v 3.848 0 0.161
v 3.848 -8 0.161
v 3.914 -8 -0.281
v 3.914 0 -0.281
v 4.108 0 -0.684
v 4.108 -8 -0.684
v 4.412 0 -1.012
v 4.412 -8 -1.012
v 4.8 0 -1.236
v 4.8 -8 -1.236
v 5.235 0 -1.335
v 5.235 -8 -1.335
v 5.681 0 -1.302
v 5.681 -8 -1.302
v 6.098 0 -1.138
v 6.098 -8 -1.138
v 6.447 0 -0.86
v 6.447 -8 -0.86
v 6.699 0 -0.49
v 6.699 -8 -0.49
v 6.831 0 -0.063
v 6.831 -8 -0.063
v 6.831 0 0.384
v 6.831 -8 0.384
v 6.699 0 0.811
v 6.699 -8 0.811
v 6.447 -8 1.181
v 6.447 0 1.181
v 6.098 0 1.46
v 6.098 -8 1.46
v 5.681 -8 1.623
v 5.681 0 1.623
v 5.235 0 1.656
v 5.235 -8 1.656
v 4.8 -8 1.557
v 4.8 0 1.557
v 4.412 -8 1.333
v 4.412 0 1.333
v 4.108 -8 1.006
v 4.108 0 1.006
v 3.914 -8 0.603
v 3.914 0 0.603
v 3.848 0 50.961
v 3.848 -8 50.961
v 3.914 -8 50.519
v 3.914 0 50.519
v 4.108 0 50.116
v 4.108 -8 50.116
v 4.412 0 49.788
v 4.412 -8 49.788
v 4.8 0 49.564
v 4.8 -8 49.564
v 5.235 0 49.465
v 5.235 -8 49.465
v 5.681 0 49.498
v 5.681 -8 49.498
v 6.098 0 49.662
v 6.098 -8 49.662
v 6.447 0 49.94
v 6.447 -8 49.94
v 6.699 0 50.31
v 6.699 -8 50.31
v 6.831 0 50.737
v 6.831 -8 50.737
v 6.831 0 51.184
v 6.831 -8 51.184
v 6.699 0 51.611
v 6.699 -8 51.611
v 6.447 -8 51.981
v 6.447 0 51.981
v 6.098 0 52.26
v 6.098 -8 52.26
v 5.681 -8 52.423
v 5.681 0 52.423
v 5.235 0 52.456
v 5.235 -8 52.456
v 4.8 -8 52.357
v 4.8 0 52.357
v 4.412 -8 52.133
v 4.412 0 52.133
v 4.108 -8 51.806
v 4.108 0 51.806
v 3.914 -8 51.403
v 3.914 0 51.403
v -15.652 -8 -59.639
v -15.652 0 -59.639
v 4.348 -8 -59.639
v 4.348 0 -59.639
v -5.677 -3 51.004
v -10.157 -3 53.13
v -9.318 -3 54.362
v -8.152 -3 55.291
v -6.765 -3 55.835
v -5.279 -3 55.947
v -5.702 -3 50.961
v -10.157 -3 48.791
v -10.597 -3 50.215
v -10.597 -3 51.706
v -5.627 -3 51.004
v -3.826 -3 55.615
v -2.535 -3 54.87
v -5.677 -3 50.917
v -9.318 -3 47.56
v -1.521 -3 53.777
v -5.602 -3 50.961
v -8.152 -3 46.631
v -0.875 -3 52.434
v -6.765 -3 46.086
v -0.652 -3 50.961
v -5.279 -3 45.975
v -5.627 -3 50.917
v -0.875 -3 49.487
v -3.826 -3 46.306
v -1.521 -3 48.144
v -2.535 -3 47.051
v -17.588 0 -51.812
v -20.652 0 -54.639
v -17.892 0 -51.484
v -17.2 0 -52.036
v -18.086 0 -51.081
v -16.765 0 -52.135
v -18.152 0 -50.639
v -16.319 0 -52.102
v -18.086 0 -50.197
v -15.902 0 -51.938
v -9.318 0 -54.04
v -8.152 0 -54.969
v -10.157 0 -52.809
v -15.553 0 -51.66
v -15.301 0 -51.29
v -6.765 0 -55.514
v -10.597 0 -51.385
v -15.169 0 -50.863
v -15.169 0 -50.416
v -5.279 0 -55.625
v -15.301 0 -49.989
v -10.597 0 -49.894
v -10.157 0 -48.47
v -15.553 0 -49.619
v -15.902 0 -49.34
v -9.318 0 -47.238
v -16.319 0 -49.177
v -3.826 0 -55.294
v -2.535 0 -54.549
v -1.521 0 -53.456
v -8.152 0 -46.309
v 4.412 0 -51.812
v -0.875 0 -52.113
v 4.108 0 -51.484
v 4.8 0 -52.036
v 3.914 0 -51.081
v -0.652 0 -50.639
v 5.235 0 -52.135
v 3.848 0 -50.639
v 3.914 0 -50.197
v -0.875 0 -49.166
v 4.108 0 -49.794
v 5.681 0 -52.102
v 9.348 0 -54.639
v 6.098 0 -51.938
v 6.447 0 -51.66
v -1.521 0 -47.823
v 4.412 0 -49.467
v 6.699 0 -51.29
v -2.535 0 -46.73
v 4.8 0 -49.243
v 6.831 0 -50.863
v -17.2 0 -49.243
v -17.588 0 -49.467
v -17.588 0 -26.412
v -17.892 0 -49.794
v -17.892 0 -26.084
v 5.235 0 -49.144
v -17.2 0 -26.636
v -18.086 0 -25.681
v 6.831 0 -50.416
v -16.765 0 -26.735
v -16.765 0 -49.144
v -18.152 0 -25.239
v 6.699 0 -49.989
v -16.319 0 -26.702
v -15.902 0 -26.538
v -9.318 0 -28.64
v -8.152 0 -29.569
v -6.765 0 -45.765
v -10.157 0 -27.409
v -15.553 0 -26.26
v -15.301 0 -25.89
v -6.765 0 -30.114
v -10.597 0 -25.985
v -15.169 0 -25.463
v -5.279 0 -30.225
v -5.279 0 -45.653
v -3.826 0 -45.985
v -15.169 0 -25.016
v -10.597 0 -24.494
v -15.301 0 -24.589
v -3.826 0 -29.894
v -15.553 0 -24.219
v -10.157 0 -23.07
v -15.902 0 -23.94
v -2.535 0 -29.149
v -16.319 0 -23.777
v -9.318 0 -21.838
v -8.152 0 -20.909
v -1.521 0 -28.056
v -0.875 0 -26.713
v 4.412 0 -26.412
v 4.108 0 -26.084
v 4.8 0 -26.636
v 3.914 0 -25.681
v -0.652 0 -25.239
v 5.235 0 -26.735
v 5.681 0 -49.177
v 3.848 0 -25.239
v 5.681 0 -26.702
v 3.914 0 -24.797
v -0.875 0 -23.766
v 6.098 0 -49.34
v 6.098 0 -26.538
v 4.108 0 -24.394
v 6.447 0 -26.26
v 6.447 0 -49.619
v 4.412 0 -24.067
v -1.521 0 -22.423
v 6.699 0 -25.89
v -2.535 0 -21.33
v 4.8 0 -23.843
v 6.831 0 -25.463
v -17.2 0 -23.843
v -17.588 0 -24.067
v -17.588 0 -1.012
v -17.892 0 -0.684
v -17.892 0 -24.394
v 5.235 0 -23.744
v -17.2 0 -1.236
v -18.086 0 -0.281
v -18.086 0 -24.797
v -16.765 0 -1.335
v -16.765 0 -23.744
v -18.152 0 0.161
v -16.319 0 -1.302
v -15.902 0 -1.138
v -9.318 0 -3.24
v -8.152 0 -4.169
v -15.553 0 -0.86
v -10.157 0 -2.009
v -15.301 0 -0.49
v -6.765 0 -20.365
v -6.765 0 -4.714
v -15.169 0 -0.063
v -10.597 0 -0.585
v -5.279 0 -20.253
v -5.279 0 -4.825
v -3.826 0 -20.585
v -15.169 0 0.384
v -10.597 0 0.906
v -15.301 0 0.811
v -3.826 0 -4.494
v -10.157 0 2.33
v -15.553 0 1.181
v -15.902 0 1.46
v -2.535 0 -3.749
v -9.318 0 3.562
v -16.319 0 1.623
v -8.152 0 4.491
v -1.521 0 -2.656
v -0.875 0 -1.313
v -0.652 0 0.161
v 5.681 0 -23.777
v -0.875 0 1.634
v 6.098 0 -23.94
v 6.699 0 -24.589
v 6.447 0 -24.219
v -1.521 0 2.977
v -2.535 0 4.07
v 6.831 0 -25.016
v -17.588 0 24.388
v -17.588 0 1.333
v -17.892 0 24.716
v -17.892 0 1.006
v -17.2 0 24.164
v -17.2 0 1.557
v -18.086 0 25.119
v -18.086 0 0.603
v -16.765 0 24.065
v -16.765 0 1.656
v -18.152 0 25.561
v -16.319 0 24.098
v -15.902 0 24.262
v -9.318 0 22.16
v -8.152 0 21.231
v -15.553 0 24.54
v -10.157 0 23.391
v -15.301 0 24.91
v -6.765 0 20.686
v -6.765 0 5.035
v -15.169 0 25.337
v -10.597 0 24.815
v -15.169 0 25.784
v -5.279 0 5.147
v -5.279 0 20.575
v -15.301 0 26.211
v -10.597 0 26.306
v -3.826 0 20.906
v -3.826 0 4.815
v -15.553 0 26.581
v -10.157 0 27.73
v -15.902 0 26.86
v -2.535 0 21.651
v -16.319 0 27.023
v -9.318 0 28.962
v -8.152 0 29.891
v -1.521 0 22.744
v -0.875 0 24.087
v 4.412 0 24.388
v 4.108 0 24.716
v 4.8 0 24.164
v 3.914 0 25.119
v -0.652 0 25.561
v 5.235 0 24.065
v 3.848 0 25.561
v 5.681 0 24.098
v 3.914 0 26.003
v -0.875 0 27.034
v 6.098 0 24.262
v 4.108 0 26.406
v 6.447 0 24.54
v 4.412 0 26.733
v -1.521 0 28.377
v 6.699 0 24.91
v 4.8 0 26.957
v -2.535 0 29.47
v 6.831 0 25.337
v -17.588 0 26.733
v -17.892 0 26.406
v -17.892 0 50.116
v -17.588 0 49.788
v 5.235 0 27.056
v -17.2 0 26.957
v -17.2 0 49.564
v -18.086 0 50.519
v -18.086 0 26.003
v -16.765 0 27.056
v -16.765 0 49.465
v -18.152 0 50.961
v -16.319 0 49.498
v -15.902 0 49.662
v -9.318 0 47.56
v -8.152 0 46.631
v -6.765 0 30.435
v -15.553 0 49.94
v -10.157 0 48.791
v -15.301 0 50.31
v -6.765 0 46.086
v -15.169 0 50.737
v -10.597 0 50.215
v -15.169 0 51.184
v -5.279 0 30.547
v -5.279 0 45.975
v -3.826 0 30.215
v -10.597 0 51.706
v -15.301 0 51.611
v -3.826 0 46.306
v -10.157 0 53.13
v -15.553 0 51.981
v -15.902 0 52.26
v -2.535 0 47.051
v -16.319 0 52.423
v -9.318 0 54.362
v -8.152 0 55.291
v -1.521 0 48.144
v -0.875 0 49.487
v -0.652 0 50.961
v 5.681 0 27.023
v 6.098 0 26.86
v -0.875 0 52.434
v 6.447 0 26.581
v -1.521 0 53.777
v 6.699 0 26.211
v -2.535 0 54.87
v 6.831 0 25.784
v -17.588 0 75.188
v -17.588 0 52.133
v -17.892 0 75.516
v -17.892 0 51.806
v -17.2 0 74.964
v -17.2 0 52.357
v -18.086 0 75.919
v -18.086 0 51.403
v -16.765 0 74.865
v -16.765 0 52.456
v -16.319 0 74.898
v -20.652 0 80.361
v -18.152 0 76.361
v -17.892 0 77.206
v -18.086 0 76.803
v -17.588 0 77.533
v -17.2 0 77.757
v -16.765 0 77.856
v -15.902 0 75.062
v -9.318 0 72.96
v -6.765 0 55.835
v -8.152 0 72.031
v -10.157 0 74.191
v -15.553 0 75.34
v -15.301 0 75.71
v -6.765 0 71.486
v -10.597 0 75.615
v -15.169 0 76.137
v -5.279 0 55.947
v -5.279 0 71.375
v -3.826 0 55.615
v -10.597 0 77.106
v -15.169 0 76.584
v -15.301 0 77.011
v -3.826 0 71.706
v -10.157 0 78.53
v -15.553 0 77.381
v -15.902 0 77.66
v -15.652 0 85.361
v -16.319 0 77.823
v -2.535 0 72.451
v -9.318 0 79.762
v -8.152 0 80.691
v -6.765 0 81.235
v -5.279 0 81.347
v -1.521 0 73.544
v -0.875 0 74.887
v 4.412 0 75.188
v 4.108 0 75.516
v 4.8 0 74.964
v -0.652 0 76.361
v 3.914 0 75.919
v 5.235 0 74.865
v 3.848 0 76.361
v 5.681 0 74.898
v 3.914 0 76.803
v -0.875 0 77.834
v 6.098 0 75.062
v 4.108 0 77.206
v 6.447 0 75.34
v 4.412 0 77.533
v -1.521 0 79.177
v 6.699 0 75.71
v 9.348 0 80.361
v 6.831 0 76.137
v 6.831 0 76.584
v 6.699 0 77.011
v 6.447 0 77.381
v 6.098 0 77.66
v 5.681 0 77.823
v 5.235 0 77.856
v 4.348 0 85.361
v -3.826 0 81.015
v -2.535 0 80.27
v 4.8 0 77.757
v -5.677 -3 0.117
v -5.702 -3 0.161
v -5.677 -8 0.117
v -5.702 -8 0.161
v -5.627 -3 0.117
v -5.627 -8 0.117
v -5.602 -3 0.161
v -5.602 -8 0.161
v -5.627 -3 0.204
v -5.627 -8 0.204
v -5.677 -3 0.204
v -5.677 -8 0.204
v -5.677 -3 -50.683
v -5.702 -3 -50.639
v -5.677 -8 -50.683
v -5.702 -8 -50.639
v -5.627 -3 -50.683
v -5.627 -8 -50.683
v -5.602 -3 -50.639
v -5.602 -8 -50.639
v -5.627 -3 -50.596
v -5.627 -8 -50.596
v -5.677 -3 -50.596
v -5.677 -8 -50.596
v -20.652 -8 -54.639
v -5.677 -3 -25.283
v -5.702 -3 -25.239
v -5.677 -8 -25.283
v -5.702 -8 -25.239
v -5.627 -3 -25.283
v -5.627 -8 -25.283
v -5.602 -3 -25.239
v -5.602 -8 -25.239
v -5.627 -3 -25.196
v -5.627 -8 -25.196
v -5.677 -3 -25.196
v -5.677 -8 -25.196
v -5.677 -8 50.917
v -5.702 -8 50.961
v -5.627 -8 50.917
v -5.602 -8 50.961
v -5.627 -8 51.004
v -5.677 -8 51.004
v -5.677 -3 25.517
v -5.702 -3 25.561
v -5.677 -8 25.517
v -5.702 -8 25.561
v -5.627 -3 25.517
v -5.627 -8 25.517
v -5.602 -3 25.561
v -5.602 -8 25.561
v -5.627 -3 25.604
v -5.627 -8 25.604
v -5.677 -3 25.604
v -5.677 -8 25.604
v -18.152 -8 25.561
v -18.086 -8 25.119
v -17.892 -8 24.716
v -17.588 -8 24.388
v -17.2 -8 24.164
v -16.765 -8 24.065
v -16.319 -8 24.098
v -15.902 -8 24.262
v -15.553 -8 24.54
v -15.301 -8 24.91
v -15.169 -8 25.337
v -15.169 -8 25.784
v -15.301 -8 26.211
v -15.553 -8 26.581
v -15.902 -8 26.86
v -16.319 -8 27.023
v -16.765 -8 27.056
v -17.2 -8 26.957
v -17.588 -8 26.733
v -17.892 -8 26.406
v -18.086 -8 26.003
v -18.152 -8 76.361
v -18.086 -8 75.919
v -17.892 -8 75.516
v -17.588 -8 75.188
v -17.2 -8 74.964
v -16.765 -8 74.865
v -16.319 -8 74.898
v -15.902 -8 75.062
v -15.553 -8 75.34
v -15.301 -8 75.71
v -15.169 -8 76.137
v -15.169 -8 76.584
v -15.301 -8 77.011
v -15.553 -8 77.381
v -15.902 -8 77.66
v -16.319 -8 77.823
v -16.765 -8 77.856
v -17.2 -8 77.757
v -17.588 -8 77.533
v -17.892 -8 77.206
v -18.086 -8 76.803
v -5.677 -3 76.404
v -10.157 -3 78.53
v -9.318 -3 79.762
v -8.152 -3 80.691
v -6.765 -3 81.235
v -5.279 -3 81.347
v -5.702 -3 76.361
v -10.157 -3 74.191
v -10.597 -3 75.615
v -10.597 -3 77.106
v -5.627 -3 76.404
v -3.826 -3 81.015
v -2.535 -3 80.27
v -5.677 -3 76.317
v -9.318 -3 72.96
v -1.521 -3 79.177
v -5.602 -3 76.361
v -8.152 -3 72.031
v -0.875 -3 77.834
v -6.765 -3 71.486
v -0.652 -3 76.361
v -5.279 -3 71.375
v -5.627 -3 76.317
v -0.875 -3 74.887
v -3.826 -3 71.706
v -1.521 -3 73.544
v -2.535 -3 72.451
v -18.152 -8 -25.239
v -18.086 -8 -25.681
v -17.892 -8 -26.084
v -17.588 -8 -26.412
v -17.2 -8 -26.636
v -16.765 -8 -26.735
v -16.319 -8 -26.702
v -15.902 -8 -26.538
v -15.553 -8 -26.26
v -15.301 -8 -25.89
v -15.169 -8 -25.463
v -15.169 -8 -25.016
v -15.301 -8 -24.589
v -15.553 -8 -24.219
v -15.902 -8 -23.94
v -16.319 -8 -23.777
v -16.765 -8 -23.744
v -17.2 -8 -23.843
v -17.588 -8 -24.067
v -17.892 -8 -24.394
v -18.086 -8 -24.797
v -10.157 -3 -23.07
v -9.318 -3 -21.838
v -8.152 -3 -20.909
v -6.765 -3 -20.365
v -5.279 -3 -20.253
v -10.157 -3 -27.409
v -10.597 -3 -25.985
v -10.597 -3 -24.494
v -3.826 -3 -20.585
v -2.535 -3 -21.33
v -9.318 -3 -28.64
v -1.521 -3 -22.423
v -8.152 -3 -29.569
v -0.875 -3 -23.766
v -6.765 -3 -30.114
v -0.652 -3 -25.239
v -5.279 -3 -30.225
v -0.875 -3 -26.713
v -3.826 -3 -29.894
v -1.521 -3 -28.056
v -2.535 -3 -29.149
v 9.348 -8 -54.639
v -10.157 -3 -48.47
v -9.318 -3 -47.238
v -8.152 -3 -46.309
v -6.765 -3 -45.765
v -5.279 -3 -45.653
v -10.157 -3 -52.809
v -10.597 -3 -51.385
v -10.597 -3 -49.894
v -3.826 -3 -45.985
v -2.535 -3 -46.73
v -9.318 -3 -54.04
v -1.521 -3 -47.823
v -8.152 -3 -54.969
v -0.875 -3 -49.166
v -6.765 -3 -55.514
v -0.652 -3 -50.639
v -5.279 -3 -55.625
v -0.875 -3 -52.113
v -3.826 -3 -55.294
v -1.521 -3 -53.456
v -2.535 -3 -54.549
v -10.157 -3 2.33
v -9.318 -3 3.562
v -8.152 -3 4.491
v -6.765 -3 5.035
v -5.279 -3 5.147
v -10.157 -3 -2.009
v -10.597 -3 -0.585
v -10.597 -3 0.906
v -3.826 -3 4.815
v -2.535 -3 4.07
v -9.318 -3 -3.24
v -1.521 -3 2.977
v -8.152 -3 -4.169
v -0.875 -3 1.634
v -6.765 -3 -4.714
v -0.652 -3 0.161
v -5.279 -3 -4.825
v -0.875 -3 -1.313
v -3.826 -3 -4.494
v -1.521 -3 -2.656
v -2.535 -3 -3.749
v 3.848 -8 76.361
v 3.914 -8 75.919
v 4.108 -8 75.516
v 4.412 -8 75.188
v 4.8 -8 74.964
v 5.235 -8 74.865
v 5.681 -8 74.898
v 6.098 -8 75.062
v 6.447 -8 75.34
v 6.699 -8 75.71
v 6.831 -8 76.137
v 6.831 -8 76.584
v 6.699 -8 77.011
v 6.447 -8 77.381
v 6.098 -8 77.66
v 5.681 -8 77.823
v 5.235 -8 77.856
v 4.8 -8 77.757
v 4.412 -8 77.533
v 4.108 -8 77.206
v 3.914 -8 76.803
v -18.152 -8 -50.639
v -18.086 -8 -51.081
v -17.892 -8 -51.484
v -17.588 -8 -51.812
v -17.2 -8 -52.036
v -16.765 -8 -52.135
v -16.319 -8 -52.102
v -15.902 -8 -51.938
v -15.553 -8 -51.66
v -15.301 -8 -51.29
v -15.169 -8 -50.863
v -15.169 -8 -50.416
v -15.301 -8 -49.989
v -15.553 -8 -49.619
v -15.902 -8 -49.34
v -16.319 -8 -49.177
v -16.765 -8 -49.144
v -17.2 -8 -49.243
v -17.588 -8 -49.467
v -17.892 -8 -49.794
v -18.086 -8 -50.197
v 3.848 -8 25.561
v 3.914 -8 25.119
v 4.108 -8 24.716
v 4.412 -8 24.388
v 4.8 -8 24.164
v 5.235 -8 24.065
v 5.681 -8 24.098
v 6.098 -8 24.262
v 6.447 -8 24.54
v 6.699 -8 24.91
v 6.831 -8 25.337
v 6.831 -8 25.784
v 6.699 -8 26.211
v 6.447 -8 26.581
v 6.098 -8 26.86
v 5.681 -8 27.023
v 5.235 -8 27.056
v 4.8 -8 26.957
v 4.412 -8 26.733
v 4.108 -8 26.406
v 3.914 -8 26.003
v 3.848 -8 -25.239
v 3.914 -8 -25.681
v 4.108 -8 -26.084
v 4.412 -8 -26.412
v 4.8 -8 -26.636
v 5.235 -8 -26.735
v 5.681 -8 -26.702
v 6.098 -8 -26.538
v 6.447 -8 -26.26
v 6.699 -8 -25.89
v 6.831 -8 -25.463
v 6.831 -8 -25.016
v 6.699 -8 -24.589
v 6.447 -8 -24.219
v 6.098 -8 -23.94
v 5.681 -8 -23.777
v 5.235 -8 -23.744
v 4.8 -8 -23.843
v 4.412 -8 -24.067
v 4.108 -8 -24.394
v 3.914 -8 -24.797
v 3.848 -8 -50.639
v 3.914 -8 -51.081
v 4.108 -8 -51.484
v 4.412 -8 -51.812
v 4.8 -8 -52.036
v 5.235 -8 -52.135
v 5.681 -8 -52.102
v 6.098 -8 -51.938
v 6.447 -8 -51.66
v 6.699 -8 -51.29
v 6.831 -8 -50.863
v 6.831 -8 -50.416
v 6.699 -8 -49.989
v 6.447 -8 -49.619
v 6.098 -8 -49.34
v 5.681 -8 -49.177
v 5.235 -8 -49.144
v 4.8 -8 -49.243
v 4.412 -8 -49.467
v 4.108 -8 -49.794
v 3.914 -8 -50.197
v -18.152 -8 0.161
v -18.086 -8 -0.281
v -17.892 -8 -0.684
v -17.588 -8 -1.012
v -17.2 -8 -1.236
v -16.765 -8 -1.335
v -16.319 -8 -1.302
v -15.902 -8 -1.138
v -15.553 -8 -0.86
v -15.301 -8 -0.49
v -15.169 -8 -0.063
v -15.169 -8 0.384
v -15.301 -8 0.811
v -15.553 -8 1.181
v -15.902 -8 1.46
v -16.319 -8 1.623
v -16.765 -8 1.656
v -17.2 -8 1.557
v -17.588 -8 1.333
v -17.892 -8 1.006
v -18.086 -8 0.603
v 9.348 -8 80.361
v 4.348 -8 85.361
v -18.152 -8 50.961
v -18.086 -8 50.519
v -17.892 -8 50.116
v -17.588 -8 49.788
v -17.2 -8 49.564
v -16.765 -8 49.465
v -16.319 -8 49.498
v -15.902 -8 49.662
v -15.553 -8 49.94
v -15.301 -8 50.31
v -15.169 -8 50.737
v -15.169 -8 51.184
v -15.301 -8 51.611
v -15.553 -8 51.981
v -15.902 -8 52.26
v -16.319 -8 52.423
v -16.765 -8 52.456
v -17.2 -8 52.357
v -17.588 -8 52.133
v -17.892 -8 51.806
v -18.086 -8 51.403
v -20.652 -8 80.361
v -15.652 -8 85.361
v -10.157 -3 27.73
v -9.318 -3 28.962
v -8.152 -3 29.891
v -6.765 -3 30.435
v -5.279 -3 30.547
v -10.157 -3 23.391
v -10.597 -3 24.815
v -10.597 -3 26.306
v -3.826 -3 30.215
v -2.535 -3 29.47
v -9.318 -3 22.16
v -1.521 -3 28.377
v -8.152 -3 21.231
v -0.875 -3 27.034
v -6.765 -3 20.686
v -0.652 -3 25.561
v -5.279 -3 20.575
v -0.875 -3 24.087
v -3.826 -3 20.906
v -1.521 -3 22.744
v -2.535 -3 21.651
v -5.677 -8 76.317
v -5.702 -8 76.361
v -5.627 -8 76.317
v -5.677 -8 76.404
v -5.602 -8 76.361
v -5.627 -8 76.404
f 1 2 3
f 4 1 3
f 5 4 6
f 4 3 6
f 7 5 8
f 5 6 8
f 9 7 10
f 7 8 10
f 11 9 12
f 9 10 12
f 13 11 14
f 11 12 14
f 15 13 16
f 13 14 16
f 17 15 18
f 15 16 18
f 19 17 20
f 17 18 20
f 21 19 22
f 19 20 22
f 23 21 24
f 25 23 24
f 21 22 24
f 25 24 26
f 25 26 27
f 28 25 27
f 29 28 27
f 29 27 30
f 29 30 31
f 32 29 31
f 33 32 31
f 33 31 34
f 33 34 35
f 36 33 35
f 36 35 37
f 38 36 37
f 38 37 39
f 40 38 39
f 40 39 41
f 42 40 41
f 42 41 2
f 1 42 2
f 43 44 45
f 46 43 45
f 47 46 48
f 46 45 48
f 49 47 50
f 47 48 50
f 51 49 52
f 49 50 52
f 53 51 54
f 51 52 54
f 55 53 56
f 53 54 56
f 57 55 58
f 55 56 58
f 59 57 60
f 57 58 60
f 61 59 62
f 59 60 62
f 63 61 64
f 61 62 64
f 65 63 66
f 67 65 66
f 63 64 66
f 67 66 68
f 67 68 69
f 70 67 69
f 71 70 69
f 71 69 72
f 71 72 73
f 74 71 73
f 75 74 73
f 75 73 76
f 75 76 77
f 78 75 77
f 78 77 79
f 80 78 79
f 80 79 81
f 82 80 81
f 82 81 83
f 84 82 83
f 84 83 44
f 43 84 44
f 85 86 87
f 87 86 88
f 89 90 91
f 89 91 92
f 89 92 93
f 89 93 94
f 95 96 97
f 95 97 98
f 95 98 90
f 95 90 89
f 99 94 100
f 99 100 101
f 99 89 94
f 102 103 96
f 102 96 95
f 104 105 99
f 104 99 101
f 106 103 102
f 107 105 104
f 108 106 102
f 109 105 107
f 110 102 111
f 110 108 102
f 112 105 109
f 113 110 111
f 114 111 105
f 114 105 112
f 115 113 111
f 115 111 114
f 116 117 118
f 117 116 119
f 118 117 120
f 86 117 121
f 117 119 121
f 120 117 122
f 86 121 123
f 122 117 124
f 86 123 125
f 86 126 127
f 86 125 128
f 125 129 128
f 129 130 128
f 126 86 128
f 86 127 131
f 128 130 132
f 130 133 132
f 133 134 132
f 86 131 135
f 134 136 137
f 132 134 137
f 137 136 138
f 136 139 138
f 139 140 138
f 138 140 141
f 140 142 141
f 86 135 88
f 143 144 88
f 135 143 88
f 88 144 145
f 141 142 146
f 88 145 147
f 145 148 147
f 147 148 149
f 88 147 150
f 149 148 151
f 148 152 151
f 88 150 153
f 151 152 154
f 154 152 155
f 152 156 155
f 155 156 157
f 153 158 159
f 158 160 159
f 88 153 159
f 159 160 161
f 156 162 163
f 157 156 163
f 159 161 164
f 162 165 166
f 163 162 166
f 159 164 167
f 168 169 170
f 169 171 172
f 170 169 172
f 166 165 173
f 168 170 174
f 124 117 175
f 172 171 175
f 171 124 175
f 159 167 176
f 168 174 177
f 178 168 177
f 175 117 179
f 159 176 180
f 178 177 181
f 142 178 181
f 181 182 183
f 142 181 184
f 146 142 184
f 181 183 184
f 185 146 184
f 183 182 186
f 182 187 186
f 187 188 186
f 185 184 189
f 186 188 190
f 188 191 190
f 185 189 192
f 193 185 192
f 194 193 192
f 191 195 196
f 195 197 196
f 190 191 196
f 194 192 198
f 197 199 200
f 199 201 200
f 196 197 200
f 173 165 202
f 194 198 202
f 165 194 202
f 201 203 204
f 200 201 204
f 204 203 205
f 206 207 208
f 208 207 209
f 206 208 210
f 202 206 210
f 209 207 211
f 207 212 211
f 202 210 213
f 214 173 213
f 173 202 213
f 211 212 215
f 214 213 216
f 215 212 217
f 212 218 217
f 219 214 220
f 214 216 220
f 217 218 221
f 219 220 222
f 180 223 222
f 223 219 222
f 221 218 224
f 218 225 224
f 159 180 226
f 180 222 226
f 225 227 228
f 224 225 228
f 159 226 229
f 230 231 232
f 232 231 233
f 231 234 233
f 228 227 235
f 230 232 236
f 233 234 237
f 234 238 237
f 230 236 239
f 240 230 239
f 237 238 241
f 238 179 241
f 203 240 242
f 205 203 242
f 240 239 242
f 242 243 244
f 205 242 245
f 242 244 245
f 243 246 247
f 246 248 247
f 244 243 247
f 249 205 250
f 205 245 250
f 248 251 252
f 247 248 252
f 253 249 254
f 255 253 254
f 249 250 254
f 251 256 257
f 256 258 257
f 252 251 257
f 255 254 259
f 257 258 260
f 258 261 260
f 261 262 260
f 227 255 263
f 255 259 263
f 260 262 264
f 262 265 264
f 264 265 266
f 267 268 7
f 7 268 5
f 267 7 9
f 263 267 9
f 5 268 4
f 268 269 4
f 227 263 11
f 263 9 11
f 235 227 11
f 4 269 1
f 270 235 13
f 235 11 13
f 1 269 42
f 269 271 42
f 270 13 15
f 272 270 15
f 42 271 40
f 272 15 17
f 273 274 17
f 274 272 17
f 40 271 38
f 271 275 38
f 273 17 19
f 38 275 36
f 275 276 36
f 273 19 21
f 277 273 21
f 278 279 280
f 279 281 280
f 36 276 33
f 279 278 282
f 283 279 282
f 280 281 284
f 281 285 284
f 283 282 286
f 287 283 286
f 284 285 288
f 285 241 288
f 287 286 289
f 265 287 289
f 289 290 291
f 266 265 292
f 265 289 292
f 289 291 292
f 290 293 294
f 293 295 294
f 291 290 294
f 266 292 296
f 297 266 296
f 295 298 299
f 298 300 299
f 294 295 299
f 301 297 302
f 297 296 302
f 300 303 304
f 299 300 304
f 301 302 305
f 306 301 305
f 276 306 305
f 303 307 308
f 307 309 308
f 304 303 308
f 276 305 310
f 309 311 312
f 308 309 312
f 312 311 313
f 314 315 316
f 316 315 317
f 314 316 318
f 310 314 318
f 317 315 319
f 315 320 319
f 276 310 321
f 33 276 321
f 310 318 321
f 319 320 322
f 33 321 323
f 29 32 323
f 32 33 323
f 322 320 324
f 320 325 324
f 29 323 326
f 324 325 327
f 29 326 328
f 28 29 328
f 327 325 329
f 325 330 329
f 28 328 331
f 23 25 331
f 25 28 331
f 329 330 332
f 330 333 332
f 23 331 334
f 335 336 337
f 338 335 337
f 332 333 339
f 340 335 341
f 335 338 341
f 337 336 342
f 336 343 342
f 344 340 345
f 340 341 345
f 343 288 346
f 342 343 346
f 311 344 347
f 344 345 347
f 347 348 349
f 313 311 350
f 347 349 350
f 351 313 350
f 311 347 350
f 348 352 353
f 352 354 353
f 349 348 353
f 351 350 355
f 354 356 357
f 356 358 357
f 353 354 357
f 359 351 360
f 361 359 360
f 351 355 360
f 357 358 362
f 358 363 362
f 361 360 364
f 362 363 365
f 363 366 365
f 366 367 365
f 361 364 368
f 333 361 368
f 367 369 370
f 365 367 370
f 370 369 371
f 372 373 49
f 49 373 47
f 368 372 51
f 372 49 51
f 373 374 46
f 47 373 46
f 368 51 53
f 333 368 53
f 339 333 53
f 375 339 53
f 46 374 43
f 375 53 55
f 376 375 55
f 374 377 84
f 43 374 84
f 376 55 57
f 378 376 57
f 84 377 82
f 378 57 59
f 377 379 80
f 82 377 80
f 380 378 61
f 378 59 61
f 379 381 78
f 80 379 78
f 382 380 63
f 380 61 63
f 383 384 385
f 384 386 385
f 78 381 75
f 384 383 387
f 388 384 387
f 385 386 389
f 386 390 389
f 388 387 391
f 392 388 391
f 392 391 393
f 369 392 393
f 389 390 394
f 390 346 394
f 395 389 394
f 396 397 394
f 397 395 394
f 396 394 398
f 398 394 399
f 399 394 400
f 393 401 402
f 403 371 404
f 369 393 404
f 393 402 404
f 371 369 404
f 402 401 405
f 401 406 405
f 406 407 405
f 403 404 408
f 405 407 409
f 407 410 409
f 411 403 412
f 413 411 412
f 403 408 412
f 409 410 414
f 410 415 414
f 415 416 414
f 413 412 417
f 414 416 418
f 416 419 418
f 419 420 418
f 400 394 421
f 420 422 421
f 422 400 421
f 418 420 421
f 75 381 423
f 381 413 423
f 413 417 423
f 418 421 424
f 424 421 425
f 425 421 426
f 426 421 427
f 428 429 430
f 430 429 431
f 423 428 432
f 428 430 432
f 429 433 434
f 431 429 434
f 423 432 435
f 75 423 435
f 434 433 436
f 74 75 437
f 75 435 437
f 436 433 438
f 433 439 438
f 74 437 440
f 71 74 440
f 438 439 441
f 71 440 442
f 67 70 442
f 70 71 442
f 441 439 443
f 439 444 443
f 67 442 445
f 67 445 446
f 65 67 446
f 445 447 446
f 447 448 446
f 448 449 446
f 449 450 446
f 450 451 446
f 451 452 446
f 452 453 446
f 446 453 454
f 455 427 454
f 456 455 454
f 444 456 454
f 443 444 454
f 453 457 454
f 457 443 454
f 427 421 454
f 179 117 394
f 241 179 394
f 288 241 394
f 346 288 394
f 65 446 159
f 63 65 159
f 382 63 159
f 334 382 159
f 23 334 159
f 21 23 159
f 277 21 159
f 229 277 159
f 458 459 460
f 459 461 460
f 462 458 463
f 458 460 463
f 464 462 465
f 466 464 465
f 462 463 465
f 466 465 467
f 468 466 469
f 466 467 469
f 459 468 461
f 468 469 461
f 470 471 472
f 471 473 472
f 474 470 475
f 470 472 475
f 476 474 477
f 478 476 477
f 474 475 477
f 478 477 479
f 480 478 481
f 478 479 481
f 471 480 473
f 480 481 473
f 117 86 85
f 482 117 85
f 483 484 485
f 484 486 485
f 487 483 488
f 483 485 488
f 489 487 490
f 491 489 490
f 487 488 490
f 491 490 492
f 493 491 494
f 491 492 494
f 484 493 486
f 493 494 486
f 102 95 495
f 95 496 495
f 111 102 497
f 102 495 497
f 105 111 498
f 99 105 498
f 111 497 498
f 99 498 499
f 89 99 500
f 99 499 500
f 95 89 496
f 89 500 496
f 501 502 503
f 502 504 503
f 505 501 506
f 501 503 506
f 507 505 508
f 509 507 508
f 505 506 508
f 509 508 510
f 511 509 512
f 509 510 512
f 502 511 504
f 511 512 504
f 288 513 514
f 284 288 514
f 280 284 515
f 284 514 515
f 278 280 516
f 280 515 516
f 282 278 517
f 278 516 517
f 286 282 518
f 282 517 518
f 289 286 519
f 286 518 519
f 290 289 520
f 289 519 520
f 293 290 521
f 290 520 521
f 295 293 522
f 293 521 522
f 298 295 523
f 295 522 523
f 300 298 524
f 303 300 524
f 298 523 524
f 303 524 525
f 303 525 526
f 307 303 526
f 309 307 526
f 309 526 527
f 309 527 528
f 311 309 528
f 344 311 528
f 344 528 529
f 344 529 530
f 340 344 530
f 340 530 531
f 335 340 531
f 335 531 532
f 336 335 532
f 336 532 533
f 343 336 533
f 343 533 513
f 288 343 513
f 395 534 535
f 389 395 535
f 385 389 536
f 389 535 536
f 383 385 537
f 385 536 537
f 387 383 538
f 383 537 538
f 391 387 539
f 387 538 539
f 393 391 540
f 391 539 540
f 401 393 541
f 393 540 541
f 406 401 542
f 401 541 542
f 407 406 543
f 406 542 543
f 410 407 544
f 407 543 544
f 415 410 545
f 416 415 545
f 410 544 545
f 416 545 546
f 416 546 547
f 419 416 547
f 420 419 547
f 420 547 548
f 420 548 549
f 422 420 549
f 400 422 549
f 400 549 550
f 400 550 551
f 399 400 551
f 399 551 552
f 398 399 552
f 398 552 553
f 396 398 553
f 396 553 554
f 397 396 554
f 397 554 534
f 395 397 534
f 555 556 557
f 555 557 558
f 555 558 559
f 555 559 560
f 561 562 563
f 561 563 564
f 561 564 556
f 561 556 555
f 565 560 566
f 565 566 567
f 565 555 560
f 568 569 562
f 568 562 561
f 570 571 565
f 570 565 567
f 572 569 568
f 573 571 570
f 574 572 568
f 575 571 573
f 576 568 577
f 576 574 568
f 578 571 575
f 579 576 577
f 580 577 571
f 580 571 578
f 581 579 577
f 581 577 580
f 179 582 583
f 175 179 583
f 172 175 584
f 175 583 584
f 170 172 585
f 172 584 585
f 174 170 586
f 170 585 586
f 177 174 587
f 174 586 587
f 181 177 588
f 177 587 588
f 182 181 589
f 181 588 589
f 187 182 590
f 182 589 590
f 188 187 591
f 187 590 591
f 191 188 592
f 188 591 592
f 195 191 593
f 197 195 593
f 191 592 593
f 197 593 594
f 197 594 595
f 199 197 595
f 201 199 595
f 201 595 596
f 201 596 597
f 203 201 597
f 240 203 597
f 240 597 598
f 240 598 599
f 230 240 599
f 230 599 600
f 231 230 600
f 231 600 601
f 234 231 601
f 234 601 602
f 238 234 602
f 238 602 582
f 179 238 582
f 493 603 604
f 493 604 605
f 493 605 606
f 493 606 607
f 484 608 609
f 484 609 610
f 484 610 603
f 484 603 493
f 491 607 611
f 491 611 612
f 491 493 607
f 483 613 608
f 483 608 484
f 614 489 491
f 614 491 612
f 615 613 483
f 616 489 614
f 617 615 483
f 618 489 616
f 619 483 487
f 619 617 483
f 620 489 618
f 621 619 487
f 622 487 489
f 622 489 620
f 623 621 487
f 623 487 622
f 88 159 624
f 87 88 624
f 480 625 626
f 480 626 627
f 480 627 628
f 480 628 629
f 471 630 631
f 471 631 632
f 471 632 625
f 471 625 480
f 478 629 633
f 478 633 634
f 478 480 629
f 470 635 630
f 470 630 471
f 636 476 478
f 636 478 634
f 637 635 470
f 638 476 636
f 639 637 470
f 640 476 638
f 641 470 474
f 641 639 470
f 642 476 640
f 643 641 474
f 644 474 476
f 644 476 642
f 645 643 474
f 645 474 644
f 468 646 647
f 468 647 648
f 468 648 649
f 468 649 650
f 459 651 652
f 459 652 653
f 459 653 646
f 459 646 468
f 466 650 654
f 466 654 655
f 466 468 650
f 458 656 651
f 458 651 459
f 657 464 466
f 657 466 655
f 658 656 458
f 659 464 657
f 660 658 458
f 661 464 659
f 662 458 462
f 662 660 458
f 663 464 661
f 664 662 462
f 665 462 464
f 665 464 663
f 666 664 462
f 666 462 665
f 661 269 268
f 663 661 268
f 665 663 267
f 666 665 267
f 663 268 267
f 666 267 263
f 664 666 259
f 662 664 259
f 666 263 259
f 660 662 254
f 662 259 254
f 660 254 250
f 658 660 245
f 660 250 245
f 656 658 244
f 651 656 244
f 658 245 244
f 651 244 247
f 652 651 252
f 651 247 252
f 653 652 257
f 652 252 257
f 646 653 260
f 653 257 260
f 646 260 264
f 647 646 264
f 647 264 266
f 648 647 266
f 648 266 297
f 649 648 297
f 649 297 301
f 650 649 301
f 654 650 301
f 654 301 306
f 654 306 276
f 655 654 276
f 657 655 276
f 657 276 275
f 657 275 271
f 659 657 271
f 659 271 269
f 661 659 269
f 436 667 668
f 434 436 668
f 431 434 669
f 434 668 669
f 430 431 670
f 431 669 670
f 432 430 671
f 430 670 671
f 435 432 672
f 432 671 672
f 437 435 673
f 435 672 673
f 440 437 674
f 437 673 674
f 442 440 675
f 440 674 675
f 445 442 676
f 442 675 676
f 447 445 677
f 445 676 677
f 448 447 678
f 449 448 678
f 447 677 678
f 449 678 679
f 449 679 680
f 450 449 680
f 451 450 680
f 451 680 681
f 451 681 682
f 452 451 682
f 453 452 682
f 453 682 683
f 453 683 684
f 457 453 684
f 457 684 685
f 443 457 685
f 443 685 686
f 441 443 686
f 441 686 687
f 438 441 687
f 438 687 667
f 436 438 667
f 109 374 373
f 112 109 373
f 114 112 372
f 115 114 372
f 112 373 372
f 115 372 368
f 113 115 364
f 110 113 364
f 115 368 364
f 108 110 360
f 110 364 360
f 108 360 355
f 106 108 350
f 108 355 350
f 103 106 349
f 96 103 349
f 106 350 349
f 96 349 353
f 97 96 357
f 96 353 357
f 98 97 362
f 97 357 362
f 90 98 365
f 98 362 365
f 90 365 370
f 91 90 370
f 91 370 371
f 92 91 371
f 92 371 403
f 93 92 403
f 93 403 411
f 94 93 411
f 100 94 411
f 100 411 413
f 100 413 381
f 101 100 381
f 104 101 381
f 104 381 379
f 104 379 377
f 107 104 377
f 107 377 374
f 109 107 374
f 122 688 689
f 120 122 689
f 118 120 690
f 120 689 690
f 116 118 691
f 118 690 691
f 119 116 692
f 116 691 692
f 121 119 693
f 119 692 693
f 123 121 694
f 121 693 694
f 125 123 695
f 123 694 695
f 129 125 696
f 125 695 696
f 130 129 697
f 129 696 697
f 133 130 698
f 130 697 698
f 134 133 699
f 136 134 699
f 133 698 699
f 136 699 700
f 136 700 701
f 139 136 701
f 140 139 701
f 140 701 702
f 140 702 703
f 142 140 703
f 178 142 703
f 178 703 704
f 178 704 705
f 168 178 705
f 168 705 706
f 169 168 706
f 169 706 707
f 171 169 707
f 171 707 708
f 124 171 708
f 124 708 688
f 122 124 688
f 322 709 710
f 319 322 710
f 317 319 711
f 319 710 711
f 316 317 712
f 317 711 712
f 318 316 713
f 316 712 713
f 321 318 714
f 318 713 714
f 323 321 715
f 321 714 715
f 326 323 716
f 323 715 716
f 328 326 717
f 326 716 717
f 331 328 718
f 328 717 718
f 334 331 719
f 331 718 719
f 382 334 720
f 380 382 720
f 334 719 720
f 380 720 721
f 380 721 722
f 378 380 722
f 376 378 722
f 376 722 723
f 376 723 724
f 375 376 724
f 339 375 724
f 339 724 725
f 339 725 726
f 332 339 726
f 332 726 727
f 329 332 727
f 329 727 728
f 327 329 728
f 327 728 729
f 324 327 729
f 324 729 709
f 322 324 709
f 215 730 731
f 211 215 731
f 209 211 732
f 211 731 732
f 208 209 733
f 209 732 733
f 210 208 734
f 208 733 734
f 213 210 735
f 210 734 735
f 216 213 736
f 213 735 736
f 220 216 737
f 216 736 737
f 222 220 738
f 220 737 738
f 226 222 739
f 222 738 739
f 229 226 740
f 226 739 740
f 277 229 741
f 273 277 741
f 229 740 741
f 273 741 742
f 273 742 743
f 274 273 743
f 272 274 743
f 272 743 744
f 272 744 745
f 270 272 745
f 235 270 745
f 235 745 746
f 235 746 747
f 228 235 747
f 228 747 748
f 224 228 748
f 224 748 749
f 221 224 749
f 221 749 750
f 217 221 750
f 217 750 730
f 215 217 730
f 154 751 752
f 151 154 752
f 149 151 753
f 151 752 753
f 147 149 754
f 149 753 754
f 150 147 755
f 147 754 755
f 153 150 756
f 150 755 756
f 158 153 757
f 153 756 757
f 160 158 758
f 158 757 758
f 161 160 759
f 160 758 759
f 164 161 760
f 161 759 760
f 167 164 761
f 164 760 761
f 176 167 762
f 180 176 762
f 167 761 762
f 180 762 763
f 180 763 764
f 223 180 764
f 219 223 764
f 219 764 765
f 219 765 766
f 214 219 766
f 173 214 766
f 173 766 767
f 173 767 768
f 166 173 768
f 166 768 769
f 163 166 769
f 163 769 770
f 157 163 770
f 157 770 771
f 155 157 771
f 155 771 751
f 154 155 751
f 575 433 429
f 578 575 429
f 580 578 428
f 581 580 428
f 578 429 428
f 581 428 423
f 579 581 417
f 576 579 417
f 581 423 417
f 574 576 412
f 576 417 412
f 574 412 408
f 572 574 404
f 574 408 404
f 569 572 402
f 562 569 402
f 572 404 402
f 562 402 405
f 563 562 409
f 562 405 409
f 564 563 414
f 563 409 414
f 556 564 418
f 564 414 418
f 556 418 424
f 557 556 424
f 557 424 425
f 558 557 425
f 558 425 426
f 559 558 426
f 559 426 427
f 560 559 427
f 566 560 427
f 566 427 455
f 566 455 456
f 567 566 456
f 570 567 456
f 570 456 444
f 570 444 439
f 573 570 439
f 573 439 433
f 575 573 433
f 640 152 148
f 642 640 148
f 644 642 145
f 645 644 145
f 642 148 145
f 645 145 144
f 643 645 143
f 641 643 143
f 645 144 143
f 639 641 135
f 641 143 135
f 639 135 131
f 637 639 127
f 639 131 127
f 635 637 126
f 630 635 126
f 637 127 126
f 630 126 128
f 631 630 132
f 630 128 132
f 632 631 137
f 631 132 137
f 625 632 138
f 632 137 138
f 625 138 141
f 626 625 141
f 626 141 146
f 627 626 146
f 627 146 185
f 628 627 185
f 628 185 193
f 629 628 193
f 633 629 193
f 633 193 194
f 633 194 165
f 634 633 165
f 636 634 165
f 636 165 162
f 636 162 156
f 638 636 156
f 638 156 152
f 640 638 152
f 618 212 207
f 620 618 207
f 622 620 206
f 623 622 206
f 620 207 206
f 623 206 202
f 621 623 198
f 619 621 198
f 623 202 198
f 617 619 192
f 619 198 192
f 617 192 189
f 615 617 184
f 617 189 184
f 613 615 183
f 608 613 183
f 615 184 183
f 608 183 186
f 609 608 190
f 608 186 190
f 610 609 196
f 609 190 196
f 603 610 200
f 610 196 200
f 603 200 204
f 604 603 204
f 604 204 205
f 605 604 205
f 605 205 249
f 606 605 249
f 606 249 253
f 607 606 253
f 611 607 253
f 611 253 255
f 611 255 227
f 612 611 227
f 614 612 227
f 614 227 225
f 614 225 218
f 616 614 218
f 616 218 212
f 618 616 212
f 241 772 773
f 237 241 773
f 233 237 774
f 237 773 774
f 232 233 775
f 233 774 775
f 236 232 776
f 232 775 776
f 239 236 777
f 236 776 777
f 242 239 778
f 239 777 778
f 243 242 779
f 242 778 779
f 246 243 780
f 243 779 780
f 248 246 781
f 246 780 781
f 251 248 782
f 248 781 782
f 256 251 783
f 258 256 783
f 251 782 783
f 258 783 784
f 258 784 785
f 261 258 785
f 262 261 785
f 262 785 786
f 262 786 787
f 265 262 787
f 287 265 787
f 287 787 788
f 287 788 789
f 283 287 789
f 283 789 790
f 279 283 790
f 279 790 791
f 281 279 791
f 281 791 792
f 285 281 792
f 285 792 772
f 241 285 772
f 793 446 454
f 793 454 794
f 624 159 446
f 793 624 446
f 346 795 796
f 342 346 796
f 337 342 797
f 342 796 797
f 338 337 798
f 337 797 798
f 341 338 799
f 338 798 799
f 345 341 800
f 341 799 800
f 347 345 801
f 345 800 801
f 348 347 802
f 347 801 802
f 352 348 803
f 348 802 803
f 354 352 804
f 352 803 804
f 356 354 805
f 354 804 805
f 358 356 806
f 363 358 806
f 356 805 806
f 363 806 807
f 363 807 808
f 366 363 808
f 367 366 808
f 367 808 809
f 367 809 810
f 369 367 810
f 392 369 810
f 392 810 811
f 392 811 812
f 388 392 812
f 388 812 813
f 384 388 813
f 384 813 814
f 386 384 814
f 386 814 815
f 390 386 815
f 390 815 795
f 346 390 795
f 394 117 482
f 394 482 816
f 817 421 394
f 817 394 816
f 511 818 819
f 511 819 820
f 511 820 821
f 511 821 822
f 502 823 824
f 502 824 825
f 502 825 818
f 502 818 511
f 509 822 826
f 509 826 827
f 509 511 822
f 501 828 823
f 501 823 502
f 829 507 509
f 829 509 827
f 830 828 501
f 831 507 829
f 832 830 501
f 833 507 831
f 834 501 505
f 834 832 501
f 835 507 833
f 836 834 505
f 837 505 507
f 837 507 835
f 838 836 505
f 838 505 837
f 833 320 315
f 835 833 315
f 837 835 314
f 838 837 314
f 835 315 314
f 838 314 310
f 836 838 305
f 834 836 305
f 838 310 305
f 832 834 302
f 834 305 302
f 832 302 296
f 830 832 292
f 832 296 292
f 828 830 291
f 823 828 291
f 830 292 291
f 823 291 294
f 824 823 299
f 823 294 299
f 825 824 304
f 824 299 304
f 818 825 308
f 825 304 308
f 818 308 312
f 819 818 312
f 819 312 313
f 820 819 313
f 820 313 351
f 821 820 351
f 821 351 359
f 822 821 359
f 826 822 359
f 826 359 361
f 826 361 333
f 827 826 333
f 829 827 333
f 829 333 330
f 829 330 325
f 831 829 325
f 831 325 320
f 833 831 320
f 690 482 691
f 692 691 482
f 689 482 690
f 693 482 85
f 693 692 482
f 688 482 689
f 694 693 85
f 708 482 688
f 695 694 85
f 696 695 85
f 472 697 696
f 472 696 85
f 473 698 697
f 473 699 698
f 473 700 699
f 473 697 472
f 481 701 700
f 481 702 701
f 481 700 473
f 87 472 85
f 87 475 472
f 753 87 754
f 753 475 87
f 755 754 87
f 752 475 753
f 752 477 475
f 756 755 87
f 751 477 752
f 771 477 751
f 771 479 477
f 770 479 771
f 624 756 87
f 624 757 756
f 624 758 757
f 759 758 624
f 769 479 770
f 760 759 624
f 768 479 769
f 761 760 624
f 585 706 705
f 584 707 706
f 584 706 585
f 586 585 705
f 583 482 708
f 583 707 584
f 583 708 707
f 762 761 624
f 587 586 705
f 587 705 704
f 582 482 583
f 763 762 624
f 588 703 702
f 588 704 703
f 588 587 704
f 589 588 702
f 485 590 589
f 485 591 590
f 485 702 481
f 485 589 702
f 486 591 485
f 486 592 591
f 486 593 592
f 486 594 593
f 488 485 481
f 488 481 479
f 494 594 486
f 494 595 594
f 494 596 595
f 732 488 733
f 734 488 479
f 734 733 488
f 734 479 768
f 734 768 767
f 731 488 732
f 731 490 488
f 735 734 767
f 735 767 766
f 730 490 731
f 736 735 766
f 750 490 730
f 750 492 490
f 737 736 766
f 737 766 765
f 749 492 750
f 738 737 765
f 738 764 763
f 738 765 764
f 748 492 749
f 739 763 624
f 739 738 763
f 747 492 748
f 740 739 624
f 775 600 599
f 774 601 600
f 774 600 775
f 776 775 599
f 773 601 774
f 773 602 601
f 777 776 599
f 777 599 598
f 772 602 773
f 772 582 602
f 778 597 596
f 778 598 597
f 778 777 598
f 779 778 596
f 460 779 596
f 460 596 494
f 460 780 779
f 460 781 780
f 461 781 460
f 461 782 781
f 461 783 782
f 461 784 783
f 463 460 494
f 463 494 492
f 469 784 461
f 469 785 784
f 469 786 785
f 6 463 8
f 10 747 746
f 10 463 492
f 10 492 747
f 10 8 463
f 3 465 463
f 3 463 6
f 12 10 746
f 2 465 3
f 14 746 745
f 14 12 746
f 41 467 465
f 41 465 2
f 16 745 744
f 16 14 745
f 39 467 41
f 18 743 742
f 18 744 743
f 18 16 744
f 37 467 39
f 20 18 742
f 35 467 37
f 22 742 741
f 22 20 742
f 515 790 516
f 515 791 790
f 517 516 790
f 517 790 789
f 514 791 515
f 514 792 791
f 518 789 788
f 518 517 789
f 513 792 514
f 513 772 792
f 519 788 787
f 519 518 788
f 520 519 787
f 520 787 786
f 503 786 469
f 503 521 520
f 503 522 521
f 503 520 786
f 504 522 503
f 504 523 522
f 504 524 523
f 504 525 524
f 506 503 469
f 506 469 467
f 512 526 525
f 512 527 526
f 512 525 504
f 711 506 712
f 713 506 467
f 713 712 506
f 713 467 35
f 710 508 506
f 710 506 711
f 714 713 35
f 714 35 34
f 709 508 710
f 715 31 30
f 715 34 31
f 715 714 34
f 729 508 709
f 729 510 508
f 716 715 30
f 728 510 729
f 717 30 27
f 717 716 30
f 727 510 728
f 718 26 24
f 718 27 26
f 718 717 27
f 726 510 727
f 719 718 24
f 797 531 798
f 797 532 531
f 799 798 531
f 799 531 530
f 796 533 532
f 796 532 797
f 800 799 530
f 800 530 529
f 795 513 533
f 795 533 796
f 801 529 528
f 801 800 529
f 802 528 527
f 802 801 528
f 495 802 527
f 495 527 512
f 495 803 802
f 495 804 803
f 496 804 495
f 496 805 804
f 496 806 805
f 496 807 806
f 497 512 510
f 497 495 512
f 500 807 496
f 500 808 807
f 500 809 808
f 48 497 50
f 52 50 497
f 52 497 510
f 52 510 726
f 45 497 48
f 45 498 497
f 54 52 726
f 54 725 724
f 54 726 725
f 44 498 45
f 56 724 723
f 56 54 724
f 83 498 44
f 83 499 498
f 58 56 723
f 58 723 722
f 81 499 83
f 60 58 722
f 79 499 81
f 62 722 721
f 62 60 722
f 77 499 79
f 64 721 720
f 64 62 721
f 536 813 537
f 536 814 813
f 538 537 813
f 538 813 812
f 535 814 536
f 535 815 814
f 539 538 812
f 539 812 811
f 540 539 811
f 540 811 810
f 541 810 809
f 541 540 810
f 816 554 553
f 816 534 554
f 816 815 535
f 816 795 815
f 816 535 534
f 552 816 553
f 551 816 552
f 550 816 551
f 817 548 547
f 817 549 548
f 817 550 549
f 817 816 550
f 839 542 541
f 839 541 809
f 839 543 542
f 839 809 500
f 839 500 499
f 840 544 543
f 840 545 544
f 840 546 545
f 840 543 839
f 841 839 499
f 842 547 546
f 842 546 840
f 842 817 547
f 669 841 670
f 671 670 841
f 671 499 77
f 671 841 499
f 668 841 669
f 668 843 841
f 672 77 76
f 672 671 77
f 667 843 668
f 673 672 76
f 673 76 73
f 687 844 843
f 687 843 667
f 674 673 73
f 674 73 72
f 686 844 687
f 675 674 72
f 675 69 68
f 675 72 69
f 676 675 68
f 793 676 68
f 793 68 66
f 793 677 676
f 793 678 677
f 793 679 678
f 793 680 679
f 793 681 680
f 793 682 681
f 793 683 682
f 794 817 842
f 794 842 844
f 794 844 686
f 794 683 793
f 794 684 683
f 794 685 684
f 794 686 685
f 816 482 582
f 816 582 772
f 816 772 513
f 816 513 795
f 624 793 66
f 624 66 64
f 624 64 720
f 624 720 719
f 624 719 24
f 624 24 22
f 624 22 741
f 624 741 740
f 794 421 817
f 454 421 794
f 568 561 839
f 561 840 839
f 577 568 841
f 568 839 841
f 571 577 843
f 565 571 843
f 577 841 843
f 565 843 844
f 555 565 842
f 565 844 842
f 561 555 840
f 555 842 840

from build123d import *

# Parameters (mm, degrees)
F0_W           = 30
F0_H           = 145
F1_DEPTH       = 8
F2_D           = 3
F3_D           = 0.1
F3_DEPTH       = 23
F3_CBORE_D     = 10
F3_CBORE_DEPTH = 3
F3_TIP         = 0.030043031
F4_SIZE        = 5


with BuildPart() as f1:
    # F0 (on Front) → F1 (new body)
    with BuildSketch(Plane.XZ):
        with Locations((-5.6524093151, 12.860655725)):
            Rectangle(F0_W, F0_H)
    extrude(amount=F1_DEPTH)

    # F2 (through all)
    with Locations(Plane(origin=(0, 0, 0), x_dir=(1, 0, 0), z_dir=(0, 1, 0))):
        with Locations((5.3475906849, -76.360655725), (5.3475906849, -50.960655725), (5.3475906849, -25.560655725), (5.3475906849, -0.160655725), (5.3475906849, 25.239344275), (5.3475906849, 50.639344275), (-16.6524093151, 50.639344275), (-16.6524093151, 25.239344275), (-16.6524093151, -0.160655725), (-16.6524093151, -25.560655725), (-16.6524093151, -50.960655725), (-16.6524093151, -76.360655725)):
            Hole(F2_D / 2)

    # F3
    with Locations(Plane(origin=(0, 0, 0), x_dir=(1, 0, 0), z_dir=(0, 1, 0))):
        with Locations((-5.6524093151, -76.360655725), (-5.6524093151, -50.960655725), (-5.6524093151, -25.560655725), (-5.6524093151, -0.160655725), (-5.6524093151, 25.239344275), (-5.6524093151, 50.639344275)):
            CounterBoreHole(F3_D / 2, F3_CBORE_D / 2, F3_CBORE_DEPTH, depth=F3_DEPTH)
            with Locations((0, 0, -(F3_DEPTH + F3_TIP / 2))):  # 118° drill point
                Cone(0, F3_D / 2, F3_TIP, mode=Mode.SUBTRACT)

    # F4
    f4_edges = [f1.edges().sort_by_distance(p)[0] for p in [
        (9.347591, -4, -59.639344),
        (-20.652409, -4, -59.639344),
        (-20.652409, -4, 85.360656),
        (9.347591, -4, 85.360656),
    ]]
    chamfer(f4_edges, length=F4_SIZE)


solid = f1.part
